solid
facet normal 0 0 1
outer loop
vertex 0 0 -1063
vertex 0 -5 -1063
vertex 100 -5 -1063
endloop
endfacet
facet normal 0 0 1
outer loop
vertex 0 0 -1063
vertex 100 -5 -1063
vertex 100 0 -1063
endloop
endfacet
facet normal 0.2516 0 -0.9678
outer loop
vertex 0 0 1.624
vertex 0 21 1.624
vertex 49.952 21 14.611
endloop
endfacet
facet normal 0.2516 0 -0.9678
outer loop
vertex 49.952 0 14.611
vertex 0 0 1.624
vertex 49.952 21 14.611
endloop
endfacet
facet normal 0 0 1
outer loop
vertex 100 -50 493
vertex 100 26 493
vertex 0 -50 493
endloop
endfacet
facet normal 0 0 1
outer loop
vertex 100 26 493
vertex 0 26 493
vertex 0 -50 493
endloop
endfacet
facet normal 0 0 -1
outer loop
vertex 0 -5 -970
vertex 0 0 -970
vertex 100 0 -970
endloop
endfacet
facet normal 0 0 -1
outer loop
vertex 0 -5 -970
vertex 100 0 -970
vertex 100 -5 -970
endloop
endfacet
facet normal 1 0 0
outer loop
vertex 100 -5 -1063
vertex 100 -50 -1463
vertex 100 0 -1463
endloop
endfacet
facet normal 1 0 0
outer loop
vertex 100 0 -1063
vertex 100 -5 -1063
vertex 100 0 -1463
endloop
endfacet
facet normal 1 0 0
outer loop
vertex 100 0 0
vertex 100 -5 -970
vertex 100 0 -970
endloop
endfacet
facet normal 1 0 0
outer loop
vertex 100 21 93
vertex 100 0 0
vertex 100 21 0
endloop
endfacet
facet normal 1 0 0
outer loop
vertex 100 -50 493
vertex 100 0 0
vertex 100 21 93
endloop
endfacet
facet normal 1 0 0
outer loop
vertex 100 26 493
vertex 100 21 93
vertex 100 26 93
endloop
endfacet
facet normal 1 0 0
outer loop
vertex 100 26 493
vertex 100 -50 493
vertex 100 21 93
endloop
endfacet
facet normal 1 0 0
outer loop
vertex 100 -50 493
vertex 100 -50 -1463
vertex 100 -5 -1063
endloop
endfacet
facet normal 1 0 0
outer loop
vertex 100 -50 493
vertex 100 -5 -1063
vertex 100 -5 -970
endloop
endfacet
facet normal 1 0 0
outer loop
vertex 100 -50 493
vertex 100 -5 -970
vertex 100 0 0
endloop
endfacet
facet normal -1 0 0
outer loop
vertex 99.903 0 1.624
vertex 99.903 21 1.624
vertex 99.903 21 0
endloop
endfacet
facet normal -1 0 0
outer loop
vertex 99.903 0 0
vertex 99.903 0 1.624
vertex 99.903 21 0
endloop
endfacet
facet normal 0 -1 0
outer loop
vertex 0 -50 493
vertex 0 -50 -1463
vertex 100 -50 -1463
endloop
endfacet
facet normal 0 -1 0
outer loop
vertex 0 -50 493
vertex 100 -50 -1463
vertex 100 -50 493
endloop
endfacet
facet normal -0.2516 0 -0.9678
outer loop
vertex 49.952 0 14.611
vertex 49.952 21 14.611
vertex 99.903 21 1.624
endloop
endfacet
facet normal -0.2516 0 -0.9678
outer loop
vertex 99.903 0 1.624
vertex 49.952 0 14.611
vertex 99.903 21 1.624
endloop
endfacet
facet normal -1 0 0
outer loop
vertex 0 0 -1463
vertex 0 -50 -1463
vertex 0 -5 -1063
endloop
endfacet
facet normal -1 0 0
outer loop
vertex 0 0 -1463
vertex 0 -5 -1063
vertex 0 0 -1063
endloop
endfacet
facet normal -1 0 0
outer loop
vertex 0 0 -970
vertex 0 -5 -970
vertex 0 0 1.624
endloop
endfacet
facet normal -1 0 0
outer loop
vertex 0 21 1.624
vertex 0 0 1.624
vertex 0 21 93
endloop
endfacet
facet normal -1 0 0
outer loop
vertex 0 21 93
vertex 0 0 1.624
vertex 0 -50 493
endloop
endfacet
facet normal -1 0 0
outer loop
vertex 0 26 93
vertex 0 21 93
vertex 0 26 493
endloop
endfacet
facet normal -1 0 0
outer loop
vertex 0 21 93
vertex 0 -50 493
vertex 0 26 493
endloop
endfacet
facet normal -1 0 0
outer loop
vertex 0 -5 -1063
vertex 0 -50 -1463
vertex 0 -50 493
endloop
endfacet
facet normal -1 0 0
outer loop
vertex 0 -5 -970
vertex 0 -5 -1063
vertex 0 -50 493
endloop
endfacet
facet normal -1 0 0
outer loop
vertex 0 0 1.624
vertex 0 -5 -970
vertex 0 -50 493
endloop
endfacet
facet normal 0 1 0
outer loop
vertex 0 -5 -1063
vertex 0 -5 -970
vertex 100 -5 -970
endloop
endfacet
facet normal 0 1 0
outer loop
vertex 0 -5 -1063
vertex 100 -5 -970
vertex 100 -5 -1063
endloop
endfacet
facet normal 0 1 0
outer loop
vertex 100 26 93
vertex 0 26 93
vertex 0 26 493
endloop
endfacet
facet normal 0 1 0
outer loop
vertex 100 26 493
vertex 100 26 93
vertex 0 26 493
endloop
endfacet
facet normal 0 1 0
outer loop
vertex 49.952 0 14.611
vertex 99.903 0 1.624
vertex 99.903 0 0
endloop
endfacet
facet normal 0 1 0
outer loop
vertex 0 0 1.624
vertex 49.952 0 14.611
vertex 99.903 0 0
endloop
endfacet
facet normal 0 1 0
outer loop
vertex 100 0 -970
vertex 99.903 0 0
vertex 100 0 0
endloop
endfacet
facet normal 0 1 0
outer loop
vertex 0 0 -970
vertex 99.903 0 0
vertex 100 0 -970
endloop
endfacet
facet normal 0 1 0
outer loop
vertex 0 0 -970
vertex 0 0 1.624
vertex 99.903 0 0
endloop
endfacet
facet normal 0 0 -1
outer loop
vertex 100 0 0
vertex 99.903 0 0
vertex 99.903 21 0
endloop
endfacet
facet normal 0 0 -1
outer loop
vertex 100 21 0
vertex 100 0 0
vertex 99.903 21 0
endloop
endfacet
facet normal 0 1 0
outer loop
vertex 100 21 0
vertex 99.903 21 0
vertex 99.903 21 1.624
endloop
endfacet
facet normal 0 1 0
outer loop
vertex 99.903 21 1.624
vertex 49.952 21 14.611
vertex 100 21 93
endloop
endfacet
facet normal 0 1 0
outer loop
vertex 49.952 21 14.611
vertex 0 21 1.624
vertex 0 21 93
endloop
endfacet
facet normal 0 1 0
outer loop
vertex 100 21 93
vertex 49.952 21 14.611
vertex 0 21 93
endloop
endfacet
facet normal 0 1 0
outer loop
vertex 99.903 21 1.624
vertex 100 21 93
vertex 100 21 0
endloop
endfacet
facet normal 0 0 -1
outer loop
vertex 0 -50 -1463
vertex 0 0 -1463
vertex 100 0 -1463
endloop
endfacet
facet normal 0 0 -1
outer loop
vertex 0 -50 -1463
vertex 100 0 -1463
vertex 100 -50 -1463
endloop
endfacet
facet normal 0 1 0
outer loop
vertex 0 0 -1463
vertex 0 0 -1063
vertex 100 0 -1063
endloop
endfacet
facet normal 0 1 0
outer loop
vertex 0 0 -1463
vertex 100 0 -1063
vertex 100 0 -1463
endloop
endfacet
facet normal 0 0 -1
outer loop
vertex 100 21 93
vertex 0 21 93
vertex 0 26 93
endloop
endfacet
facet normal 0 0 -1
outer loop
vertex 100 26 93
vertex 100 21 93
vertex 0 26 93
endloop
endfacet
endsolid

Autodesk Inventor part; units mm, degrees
ref_plane "YZ Plane" through (0, 0, 0) normal (1, 0, 0) x (0, 1, 0)
ref_plane "XZ Plane" through (0, 0, 0) normal (0, 1, 0) x (-1, 0, 0)
ref_plane "XY Plane" through (0, 0, 0) normal (0, 0, 1) x (1, 0, 0)
sketch "Эскиз1" plane through (0, 0, 0) normal (1, 0, 0) x (0, 1, 0)
  line L0 (0, 0) -> (0, -970)
  line L1 (0, -970) -> (-5, -970)
  line L2 (-5, -970) -> (-5, -1063)
  line L3 (-5, -1063) -> (0, -1063)
  line L4 (0, -1063) -> (0, -1463)
  line L5 (0, -1463) -> (-50, -1463)
  line L6 (-50, -1463) -> (-50, 493)
  line L7 (0, 0) -> (21, 0)
  line L8 (21, 0) -> (21, 93)
  line L9 (21, 93) -> (26, 93)
  line L10 (26, 93) -> (26, 493)
  line L11 (26, 493) -> (-50, 493)
  dimension "d0" = 970
  dimension "d1" = 5
  dimension "d2" = 93
  dimension "d3" = 400
  dimension "d4" = 50
  dimension "d5" = 21
  dimension "d6" = 93
  dimension "d7" = 5
  dimension "d8" = 400
  dimension "d9" = 1956
extrude "Выдавливание1" add sketch "Эскиз1" along normal blind 100
sketch "Эскиз2" plane through (0, 21, 93) normal (0, 1, 0) x (1, 0, 0)
  line L0 (0, 91.3764) -> (49.9516, 78.389)
  line L1 (0, 93) -> (0, 91.3764)
  line L2 (0, 93) -> (99.9032, 93)
  line L3 (99.9032, 91.3764) -> (99.9032, 93)
  line L4 (49.9516, 78.389) -> (99.9032, 91.3764)
extrude "Выдавливание2" cut sketch "Эскиз2" against normal up to surface (21 mm away)
properties part number "ground_all"
